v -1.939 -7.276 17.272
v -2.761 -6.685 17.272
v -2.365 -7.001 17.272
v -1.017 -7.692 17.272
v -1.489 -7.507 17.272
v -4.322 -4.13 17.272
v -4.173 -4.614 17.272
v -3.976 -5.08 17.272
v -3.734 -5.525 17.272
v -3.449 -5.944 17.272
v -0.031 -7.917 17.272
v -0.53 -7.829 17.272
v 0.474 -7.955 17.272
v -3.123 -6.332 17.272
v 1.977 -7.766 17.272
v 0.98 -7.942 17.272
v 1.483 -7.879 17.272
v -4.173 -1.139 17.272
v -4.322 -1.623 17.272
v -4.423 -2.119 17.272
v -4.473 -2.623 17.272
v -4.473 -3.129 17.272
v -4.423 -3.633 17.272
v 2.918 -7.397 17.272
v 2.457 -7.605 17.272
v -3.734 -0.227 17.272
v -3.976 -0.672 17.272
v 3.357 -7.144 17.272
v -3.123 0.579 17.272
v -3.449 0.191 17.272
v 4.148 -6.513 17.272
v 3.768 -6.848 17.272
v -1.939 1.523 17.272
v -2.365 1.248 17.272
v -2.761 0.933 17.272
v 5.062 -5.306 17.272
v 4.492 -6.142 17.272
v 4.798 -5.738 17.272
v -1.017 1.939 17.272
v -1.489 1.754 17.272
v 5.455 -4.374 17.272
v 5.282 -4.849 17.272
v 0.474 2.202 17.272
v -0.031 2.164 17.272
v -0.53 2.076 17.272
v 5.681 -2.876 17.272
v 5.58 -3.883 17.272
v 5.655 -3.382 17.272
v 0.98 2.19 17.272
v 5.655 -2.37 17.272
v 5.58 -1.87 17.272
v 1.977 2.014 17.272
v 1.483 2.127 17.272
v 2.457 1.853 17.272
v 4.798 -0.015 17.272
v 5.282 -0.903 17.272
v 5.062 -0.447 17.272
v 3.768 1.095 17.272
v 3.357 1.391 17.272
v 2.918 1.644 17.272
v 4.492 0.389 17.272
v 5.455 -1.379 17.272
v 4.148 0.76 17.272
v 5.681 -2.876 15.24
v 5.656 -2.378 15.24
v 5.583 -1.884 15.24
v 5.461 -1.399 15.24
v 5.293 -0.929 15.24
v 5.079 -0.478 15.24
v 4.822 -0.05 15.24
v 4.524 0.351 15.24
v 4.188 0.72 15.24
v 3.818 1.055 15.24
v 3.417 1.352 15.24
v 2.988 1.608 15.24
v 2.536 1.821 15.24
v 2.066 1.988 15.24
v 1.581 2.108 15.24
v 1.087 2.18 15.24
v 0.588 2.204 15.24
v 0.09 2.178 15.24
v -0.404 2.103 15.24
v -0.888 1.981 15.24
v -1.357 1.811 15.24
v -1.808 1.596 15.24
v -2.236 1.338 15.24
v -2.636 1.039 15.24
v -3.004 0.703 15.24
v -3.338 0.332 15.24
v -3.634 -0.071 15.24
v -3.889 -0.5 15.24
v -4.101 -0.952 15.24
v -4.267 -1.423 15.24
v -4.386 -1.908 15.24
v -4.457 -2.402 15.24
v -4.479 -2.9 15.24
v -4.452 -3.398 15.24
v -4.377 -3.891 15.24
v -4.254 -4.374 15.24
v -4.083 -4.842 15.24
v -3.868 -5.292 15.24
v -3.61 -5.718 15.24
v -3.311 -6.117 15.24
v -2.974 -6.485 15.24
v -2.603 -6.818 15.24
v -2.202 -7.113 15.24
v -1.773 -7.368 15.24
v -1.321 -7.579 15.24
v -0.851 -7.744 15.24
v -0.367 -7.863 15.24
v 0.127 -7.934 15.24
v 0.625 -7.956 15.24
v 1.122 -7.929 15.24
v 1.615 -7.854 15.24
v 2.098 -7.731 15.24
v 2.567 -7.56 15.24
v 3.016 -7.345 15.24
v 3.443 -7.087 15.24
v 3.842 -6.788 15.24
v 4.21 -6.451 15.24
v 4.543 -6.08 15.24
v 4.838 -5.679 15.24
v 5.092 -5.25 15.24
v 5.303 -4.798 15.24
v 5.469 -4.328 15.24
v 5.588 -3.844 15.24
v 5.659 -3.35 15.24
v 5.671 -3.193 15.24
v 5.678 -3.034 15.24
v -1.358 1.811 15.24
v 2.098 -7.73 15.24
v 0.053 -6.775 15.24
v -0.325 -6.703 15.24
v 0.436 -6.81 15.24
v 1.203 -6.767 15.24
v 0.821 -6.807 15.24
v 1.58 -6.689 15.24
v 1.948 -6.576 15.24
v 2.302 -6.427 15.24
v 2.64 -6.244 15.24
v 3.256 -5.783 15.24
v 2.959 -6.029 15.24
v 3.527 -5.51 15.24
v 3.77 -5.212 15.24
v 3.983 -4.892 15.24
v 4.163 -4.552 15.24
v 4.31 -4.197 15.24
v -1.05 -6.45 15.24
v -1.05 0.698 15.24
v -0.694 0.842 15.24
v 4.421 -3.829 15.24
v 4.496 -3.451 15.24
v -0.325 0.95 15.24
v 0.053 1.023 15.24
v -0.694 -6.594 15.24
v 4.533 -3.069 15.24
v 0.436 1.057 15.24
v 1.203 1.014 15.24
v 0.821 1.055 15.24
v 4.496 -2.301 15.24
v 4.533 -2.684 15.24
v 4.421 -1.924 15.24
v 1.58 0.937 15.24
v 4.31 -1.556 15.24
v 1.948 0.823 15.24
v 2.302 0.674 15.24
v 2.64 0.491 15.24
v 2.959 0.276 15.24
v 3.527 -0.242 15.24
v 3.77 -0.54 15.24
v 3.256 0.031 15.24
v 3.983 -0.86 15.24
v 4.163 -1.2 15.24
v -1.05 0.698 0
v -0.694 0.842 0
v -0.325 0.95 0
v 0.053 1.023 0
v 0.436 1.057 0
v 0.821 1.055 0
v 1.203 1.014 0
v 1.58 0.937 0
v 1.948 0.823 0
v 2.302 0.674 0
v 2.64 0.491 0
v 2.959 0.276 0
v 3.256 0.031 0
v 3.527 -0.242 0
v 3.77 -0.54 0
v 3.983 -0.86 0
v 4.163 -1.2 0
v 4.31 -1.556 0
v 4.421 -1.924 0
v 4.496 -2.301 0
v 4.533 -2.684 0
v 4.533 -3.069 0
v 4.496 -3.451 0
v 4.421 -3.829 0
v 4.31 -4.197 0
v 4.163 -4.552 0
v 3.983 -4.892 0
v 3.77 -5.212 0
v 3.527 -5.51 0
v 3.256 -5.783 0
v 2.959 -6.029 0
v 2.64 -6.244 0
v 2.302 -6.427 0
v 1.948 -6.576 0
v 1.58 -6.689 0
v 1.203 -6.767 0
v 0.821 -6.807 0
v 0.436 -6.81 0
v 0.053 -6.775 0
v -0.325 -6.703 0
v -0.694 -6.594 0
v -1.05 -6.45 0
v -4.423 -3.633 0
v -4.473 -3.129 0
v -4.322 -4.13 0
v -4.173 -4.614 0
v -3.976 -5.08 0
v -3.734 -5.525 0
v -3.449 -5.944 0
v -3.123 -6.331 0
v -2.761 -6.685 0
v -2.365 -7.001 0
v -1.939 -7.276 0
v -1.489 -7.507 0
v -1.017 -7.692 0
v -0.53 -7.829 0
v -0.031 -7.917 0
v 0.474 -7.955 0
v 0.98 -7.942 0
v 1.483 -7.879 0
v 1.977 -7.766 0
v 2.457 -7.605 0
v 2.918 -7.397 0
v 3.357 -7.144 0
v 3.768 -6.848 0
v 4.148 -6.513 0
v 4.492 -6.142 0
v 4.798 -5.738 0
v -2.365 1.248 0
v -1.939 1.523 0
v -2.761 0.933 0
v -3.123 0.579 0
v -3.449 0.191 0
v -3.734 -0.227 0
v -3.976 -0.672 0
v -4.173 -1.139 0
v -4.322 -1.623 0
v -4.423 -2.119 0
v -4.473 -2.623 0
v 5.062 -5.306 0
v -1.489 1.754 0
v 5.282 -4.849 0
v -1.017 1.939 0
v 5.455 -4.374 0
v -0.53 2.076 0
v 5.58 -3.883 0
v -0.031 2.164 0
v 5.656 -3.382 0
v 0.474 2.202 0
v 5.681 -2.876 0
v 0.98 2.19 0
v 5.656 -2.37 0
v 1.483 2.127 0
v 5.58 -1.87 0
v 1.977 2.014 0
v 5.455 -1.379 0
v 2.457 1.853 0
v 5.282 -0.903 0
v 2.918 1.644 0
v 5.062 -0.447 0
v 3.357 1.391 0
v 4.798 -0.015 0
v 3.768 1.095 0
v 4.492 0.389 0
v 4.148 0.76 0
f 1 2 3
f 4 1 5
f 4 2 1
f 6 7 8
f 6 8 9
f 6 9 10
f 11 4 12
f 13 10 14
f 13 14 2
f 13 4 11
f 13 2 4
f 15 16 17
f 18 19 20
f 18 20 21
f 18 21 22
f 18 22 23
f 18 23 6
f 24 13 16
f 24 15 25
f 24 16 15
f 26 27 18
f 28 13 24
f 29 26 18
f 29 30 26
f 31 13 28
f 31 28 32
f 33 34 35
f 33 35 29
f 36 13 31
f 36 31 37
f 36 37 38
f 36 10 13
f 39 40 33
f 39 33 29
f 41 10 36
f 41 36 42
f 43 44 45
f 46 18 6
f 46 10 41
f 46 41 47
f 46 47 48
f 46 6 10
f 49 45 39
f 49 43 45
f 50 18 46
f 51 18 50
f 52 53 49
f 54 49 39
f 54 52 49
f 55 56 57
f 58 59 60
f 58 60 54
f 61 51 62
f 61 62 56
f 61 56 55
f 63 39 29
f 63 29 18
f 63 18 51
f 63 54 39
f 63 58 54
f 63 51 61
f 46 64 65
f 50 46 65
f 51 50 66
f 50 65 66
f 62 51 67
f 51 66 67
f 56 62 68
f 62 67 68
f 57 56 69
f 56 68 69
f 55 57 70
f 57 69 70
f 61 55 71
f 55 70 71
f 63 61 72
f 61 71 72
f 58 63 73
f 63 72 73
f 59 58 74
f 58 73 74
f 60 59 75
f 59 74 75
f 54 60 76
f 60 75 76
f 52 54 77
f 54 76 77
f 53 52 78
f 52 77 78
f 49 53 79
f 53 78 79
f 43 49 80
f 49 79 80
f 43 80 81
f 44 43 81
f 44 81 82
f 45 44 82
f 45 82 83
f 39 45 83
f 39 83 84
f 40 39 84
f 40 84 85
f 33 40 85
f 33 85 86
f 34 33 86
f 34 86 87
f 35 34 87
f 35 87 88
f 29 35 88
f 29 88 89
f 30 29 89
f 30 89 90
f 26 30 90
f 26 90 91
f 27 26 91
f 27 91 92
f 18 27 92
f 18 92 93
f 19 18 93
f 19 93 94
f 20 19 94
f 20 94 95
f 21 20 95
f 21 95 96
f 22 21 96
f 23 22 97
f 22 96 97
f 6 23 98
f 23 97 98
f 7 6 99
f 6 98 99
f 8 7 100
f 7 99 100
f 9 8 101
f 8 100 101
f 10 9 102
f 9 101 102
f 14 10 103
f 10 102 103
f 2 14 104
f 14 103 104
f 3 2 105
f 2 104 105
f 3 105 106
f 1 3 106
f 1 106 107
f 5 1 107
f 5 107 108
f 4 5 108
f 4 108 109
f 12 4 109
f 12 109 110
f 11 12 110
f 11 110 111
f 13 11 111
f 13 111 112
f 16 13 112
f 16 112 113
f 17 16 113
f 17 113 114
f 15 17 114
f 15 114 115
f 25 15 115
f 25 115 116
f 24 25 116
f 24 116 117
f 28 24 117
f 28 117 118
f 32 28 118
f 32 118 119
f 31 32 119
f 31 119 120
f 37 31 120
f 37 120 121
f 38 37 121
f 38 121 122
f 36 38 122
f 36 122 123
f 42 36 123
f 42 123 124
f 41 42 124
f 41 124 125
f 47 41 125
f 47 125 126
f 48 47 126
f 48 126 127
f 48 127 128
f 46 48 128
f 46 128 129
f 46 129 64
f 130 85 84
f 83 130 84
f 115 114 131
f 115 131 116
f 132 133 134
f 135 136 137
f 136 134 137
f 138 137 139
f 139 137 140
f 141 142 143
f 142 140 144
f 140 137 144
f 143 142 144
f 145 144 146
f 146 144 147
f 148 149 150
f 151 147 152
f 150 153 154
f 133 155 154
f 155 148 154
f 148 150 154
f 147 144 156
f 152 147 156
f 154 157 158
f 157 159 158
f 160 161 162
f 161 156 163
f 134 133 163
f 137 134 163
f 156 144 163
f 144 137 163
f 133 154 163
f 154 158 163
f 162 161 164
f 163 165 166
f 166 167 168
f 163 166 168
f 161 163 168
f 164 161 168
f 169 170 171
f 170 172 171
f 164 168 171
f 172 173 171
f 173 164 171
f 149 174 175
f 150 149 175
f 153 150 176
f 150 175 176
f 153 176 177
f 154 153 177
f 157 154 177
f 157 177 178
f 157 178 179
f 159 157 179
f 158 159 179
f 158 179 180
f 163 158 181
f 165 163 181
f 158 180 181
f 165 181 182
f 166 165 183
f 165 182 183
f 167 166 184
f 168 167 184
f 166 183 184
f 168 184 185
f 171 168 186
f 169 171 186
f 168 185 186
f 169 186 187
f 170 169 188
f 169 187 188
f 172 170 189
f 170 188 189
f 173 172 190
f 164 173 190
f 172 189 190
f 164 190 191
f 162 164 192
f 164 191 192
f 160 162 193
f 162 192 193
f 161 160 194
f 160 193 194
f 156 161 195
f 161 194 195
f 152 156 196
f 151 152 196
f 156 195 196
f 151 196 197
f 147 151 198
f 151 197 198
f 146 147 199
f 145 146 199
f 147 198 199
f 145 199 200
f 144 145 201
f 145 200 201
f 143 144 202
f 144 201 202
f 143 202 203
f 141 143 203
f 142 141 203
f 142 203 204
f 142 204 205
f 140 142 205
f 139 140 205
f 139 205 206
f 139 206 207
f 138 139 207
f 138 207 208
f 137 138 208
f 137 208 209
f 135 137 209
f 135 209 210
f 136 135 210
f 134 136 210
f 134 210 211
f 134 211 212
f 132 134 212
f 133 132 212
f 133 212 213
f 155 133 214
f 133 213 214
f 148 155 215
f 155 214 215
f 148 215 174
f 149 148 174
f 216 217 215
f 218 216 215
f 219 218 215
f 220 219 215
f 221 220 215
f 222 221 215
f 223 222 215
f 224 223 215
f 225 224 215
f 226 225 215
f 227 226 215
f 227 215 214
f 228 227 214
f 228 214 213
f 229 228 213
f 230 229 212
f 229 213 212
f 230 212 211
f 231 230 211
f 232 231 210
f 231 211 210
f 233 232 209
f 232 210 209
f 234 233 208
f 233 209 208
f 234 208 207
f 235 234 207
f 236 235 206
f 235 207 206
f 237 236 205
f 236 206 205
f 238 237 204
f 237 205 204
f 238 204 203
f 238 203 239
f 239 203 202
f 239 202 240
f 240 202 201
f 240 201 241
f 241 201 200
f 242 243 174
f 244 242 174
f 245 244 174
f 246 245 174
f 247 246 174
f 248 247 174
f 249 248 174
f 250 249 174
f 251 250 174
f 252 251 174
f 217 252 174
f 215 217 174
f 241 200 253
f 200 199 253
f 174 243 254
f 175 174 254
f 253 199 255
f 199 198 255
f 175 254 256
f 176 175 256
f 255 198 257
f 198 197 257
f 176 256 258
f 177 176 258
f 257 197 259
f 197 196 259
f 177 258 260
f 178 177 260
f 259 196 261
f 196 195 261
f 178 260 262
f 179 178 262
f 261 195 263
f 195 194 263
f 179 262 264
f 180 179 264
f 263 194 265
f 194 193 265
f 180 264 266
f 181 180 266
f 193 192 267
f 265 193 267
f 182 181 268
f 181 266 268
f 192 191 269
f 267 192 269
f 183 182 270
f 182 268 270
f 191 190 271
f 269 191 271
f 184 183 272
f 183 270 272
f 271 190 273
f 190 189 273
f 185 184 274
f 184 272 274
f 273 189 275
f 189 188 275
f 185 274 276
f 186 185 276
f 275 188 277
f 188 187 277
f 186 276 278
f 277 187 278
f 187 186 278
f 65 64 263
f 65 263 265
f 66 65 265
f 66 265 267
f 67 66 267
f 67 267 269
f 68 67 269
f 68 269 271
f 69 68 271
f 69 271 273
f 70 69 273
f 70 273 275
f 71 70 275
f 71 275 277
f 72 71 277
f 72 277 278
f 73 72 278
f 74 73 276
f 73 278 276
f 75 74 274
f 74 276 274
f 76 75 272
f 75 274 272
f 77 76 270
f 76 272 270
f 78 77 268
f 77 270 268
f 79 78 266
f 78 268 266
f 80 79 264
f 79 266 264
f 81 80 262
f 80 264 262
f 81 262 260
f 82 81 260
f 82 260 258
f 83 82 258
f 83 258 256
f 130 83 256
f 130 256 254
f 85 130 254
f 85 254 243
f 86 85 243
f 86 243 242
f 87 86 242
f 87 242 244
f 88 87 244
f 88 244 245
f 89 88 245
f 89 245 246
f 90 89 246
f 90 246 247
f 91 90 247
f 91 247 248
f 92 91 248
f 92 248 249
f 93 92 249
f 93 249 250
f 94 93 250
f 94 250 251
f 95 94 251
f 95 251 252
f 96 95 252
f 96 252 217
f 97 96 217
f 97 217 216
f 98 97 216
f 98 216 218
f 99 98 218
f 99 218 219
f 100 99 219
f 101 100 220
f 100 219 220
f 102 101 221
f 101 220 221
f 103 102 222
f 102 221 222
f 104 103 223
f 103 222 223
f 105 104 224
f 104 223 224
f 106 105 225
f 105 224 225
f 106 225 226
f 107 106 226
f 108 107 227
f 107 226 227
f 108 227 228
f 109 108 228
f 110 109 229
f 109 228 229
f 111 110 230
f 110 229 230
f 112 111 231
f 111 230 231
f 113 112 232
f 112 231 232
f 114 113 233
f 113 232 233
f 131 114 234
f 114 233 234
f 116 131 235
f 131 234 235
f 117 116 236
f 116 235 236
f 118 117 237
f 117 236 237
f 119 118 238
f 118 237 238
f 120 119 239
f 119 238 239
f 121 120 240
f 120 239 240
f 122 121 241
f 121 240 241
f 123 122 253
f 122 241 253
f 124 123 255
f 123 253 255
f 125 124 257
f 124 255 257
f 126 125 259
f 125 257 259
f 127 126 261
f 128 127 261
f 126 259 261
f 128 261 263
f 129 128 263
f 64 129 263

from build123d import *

# Parameters (mm, degrees)
F0_R     = 5.08
F1_DEPTH = 15.24
F3_R     = 5.08
F4_DEPTH = 2.032


with BuildPart() as f1:
    # F0 (on Top) → F1 (new body)
    with BuildSketch(Plane.XY):
        with Locations((0.600746, -2.876205)):
            Circle(F0_R)
        with BuildLine():
            Line((-1.050254, -6.450302), (-1.050254, -2.876205))
            Line((-1.050254, -2.876205), (-1.050254, 0.697892))
            ThreePointArc((-1.050254, 0.697892), (4.537746, -2.876205), (-1.050254, -6.450302))
        make_face(mode=Mode.SUBTRACT)
    extrude(amount=F1_DEPTH)

    # F3 (on offset) → F4 (join)
    with BuildSketch(Plane.XY.offset(15.24)):
        with Locations((0.600743, -2.876237)):
            Circle(F3_R)
    extrude(amount=F4_DEPTH)


solid = f1.part
